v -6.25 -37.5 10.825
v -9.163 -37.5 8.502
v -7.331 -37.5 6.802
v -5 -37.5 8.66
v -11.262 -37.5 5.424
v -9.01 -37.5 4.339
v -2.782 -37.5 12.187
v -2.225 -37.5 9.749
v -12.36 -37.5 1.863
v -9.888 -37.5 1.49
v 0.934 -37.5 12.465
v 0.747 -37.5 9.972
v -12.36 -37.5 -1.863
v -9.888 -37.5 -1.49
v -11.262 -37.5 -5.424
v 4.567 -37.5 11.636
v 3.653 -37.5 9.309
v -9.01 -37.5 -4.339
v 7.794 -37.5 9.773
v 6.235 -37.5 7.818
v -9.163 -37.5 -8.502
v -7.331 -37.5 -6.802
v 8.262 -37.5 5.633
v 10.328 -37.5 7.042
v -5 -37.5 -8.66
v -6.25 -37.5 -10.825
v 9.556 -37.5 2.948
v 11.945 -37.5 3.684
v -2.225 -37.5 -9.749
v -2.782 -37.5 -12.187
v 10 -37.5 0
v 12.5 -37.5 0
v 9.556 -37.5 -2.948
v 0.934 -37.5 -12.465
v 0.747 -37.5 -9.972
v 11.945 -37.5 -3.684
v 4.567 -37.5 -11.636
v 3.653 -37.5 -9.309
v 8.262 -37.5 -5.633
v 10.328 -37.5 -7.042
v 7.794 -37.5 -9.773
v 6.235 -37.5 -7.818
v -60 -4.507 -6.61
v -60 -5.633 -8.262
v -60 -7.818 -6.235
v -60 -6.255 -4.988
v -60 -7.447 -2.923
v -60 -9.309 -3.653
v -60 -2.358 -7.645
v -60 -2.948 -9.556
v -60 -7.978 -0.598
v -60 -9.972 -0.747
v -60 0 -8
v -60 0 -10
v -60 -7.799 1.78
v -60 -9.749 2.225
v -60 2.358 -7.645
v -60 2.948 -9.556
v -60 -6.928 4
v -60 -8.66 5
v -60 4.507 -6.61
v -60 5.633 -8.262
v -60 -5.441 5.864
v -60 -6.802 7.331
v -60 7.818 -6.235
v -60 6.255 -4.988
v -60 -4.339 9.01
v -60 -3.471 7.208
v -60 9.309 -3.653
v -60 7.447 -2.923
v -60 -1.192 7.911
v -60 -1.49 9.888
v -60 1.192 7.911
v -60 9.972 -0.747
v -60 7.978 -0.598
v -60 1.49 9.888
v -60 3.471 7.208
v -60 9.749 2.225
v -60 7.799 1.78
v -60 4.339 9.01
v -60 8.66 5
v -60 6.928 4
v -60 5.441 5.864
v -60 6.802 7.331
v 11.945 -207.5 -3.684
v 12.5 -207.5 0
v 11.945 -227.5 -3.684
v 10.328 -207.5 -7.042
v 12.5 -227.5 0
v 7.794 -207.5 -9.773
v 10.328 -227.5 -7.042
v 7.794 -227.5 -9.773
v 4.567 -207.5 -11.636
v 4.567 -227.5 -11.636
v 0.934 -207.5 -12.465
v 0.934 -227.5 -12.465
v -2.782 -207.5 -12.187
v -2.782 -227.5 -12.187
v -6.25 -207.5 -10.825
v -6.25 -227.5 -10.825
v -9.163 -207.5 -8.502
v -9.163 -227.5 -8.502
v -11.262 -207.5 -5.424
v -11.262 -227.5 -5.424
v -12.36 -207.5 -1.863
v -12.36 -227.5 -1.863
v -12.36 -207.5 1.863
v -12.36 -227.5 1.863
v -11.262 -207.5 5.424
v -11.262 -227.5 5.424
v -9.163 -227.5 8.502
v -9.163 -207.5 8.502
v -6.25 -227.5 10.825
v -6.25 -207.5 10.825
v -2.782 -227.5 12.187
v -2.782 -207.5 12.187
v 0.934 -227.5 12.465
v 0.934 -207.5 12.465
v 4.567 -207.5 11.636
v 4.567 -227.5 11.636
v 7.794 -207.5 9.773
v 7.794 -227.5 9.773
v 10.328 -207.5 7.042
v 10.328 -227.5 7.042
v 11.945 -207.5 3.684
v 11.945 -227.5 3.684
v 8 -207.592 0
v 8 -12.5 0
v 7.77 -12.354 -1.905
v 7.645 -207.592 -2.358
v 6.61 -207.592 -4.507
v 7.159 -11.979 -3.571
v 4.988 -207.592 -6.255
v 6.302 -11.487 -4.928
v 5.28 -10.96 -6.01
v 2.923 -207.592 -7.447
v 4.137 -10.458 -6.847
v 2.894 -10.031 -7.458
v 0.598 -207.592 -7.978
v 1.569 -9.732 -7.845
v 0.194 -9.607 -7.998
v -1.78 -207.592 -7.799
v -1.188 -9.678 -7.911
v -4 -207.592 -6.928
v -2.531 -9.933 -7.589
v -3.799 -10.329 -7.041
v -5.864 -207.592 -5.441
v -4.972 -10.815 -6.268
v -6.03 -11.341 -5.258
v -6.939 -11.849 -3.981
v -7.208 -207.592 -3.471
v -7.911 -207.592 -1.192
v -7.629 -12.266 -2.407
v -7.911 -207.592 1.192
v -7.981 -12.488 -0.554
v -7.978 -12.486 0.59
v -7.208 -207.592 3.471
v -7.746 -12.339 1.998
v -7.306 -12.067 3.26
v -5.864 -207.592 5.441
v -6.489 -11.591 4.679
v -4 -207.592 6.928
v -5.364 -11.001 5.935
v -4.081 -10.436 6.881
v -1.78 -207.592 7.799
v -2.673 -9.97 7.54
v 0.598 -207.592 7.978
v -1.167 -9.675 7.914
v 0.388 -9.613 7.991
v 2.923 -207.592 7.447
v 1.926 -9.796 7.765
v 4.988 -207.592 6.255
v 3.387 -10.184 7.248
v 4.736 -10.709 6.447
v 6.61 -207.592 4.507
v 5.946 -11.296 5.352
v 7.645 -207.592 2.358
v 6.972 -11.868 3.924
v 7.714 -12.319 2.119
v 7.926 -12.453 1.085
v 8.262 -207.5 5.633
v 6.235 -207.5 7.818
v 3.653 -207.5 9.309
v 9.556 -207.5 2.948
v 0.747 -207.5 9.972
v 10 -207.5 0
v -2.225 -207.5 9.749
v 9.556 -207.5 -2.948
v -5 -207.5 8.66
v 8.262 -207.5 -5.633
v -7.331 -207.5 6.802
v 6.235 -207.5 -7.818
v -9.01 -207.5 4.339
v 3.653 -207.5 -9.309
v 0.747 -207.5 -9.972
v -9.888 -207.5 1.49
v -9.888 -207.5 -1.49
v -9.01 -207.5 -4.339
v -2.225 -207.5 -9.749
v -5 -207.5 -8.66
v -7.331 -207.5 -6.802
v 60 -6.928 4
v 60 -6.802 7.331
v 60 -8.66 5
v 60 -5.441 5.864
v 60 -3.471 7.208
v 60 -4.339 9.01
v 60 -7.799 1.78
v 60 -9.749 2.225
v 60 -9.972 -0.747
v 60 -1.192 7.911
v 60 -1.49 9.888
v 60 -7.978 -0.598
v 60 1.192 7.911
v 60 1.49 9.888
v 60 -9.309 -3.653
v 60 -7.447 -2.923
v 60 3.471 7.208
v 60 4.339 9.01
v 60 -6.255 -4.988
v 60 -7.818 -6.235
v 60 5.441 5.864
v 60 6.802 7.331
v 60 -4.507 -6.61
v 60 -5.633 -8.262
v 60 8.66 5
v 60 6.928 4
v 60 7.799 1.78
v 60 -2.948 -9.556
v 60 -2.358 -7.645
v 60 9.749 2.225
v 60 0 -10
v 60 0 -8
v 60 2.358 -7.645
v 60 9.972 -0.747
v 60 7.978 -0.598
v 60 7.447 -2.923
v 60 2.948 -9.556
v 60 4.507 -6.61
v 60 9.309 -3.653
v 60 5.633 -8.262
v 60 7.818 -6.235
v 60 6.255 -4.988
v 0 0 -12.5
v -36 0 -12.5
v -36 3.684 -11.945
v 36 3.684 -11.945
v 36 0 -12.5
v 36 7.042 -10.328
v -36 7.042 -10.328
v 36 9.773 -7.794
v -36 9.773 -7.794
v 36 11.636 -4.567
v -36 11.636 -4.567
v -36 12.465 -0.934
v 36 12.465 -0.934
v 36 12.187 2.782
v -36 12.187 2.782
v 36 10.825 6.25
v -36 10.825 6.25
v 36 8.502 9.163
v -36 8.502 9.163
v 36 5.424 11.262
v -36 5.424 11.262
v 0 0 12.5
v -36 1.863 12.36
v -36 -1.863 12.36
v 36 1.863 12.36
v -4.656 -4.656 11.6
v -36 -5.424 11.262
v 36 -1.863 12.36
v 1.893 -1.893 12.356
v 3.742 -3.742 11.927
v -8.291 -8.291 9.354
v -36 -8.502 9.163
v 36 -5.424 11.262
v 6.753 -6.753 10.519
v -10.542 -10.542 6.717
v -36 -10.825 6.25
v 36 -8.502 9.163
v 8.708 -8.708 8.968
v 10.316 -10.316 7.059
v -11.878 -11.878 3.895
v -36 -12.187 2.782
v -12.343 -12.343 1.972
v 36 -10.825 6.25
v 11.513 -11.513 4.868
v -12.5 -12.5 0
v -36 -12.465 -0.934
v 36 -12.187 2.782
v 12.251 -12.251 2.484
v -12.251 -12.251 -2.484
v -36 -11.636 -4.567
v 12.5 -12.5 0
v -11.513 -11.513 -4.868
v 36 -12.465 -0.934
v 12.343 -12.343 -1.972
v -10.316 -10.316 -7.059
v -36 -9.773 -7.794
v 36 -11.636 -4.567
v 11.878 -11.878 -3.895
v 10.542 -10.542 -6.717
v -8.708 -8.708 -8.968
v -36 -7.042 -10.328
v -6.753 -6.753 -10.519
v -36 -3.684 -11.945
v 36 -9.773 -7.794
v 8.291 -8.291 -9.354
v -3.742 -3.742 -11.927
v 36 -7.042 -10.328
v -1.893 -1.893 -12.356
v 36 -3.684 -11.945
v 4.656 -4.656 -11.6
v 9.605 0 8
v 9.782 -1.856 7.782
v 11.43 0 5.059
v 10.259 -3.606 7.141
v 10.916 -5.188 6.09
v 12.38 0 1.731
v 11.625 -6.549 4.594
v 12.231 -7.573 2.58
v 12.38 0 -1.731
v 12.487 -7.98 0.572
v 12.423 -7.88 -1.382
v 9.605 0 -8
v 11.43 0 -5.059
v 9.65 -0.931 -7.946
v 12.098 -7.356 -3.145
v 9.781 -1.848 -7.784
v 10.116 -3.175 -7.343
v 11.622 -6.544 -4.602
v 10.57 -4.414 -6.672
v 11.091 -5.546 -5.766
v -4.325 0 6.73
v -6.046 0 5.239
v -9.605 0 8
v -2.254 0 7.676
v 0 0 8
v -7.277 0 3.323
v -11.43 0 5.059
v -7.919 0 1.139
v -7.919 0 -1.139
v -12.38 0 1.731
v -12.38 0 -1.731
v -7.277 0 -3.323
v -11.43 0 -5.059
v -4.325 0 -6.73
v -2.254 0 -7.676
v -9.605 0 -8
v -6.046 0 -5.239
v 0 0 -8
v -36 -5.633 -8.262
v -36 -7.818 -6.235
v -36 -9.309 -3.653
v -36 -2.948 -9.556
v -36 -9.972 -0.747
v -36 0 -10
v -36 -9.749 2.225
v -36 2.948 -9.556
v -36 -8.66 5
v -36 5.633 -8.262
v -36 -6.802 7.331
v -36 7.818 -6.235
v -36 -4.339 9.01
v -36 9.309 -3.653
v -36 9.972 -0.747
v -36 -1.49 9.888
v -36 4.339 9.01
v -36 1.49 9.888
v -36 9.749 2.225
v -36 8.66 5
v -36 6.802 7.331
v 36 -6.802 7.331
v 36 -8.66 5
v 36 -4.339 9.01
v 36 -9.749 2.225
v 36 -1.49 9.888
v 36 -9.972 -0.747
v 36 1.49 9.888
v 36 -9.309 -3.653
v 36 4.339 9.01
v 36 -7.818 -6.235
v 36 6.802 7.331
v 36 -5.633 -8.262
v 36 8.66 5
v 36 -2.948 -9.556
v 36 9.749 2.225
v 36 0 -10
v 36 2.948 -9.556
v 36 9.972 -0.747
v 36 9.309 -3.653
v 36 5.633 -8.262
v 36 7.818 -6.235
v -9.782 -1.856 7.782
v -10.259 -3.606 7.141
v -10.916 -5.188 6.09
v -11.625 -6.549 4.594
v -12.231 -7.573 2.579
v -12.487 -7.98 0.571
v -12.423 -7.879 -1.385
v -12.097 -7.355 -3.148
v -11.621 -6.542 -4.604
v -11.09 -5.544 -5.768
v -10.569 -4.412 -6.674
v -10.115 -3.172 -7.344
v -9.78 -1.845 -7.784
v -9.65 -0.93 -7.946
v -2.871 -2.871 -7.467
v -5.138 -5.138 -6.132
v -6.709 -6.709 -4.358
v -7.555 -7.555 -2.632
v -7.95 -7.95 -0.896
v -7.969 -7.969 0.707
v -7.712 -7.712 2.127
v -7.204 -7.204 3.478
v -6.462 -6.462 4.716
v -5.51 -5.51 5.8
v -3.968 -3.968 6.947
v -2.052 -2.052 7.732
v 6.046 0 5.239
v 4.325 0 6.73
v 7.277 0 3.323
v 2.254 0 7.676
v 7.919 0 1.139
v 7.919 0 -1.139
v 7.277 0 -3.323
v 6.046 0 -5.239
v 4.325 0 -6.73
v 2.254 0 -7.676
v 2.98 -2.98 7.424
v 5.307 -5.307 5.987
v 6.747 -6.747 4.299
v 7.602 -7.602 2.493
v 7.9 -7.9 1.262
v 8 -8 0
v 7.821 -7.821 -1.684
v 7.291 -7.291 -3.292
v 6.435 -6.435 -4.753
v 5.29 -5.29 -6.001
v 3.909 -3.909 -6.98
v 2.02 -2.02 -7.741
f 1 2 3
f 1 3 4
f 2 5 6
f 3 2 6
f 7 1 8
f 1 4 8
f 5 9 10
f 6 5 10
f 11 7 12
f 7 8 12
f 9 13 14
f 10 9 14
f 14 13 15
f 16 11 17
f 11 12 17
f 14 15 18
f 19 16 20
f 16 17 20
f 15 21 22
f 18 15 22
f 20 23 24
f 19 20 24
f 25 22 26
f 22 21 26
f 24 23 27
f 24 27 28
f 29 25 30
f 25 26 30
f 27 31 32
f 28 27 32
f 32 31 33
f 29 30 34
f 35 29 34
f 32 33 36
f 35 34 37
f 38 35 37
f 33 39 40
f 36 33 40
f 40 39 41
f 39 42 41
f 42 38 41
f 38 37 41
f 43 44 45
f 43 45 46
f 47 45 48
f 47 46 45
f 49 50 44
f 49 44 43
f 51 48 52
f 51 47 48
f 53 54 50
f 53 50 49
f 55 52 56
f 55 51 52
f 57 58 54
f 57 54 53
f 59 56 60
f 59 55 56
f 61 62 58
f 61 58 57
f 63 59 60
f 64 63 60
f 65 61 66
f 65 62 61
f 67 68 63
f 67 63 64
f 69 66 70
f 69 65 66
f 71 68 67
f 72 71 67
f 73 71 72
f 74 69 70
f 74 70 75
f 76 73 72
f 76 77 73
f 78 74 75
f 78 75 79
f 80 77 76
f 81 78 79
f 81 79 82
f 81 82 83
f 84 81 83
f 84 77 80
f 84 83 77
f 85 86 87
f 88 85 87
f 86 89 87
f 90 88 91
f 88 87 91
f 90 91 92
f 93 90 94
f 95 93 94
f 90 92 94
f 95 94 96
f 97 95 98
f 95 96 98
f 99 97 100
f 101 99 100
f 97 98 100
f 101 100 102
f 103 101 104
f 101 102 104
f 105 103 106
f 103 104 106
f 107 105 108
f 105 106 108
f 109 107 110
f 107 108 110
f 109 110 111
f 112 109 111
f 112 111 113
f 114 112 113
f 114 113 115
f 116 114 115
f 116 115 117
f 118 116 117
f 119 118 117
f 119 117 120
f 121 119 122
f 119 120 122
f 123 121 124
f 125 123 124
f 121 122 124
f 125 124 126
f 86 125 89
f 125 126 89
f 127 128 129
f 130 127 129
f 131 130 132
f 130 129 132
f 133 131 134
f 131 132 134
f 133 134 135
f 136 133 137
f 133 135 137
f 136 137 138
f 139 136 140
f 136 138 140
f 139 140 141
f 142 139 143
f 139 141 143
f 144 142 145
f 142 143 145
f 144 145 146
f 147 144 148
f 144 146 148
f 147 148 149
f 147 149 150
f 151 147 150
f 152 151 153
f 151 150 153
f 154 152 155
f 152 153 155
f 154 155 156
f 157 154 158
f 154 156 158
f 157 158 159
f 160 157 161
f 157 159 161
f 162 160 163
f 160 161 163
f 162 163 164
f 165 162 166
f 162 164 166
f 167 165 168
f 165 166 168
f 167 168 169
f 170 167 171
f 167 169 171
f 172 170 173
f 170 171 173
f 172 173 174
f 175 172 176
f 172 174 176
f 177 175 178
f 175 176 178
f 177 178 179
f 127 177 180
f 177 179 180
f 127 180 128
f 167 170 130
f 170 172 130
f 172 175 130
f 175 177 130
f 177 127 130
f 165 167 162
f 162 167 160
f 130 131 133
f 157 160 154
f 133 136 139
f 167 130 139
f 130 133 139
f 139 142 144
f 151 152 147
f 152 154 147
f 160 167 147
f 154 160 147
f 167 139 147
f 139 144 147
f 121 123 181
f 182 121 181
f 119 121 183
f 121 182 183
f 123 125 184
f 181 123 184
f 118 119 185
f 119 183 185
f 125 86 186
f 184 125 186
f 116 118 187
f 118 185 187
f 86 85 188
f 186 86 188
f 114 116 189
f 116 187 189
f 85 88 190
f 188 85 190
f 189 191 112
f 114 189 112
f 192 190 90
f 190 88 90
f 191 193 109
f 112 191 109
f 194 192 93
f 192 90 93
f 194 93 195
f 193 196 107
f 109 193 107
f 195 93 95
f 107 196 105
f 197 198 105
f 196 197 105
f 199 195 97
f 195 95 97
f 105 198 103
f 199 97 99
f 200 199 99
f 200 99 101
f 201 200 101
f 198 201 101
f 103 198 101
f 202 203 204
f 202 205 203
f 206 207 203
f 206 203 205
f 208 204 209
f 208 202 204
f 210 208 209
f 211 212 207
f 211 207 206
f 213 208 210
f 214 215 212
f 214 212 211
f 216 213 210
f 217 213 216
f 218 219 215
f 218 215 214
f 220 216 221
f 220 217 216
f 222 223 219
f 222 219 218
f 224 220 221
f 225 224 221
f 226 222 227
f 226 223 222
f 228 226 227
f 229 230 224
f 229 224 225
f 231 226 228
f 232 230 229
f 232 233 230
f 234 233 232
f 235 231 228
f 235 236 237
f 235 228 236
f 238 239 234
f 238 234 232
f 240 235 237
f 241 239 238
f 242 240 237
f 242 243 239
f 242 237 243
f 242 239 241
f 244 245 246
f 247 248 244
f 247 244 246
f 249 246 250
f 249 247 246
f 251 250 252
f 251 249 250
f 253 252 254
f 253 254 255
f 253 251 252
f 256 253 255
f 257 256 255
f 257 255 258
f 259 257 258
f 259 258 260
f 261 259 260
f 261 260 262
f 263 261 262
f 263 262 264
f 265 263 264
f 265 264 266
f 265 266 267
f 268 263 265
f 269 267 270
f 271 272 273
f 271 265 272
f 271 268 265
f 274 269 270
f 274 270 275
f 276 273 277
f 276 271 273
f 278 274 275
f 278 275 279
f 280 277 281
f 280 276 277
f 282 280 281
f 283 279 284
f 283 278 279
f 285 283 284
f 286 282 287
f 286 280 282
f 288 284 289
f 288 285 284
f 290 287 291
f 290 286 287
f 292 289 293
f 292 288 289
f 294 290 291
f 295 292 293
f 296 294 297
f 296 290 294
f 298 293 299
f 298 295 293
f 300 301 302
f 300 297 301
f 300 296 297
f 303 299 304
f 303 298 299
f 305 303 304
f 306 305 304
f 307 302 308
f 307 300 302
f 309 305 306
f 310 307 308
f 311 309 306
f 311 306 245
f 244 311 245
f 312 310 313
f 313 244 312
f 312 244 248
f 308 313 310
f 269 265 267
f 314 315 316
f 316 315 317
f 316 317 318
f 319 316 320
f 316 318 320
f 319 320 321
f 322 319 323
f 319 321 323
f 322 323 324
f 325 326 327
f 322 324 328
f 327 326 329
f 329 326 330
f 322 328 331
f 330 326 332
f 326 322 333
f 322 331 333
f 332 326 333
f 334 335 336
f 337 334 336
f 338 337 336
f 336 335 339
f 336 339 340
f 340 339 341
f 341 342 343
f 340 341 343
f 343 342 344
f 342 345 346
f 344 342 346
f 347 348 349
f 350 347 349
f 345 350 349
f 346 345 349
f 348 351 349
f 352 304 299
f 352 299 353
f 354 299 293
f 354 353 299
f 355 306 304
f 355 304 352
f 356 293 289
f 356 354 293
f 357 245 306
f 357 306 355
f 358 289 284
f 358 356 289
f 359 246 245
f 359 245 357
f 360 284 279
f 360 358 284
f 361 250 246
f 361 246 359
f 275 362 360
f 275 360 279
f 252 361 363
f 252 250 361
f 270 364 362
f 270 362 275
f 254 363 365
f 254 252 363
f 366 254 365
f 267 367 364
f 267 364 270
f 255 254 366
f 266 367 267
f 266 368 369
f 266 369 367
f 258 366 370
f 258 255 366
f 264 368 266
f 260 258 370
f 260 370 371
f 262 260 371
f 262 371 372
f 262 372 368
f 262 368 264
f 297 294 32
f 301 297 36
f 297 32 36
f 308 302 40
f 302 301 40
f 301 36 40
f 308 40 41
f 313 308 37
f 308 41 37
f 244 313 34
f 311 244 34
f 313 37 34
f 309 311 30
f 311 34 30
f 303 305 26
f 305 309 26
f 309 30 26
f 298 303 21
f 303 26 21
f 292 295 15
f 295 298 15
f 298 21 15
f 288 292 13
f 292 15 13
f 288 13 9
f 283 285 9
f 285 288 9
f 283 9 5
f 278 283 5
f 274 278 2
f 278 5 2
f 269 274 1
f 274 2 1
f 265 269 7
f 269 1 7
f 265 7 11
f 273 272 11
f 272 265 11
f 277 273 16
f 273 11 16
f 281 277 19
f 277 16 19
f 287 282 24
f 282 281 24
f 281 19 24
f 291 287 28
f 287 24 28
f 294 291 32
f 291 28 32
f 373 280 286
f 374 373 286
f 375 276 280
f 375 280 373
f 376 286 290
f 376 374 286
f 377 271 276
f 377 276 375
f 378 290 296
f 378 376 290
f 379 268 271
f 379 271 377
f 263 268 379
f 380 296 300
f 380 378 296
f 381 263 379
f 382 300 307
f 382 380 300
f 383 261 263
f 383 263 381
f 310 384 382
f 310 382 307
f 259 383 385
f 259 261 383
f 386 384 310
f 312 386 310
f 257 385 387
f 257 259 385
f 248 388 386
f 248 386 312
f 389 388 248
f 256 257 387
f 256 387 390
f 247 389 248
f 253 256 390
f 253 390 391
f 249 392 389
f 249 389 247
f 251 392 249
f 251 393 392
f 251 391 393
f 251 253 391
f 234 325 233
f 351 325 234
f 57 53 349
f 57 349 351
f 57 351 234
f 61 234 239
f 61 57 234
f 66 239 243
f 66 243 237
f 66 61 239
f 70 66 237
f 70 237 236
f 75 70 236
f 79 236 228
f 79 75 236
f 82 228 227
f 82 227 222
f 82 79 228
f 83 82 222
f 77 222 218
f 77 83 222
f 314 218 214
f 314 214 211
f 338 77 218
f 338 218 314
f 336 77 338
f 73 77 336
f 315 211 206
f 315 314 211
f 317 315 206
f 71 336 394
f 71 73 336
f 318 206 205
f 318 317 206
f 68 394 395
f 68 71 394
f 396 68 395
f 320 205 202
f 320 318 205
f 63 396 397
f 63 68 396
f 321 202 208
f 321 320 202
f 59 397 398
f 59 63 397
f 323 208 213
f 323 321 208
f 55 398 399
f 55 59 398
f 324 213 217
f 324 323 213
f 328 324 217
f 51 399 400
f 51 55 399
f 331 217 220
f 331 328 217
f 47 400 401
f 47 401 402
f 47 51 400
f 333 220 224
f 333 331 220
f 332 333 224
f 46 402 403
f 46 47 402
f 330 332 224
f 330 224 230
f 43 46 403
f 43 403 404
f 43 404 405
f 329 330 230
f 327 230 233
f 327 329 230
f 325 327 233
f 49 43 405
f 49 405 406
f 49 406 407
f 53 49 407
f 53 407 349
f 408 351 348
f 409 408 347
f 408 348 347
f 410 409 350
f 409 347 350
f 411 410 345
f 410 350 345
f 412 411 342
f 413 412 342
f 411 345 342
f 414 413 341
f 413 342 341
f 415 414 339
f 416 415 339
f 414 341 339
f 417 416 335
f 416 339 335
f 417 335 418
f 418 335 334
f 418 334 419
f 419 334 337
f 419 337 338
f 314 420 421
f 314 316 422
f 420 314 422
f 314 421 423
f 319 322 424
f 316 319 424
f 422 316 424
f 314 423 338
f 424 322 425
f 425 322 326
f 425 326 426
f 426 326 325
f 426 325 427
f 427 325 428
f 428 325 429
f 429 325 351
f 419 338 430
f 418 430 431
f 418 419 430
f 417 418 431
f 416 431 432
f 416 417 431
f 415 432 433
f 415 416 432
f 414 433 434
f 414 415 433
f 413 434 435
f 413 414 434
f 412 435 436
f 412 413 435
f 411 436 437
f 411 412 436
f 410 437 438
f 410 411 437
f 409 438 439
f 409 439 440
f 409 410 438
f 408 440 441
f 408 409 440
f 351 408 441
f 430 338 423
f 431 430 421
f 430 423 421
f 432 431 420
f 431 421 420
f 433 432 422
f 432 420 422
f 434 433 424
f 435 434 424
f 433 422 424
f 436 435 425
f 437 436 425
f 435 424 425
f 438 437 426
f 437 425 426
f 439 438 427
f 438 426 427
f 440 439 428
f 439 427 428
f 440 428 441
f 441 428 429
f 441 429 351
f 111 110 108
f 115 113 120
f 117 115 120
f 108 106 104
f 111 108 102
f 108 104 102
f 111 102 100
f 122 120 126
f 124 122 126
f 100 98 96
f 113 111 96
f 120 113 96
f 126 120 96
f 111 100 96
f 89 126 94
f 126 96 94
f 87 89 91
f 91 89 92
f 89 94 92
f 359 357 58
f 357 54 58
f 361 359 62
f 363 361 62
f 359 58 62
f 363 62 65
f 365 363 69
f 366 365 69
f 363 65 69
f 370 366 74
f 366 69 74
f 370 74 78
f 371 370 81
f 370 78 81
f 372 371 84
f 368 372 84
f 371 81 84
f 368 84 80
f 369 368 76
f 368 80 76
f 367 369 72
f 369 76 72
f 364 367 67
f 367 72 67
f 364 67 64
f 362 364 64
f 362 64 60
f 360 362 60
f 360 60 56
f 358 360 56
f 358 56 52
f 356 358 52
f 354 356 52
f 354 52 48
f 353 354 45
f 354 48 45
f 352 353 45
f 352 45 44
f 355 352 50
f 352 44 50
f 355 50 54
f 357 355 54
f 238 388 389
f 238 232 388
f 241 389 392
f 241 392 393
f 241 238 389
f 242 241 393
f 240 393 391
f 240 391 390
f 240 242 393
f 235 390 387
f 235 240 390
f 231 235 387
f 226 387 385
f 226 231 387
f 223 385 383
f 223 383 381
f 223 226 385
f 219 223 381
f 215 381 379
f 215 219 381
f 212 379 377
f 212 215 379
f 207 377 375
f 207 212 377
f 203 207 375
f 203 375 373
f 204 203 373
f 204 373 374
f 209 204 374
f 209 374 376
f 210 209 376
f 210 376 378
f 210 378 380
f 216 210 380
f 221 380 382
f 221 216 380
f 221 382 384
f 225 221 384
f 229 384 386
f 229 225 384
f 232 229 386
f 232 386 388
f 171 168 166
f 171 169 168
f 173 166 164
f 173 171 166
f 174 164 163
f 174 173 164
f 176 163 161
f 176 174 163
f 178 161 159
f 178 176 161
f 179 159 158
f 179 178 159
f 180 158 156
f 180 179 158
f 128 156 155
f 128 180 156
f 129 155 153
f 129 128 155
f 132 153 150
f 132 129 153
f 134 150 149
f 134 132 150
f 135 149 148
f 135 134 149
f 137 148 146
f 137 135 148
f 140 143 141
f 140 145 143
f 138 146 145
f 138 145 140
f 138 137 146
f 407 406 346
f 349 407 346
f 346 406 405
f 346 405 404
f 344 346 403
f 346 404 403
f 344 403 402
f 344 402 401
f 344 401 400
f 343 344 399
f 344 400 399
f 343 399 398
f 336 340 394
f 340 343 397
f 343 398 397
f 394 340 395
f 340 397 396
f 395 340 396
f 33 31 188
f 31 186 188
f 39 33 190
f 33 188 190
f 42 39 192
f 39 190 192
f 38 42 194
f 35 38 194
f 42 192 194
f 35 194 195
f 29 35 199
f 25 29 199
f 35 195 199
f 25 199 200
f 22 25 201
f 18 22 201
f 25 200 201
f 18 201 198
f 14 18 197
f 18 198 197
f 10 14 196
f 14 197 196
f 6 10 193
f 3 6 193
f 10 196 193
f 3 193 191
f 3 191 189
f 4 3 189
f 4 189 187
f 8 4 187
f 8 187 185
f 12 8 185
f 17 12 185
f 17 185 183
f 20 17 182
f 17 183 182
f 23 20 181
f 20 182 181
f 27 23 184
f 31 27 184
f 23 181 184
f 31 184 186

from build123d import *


with BuildPart() as part:
    # 草图1 → Revolve 394 (revolve)
    with BuildSketch(Plane.XY):
        Polygon((-12.5, 0), (-12.5, -37.5), (-10, -37.5), (-10, -207.5), (-12.5, -207.5), (-12.5, -227.5), (0, -227.5), (0, -207.591623727), (-8, -207.591623727), (-8, 0), align=None)
    revolve(axis=Axis((0, -1459.557248463, 0), (0, 1, 0)))


with BuildPart() as revolve_813_tool:
    # 草图3 → Revolve 813 (revolve)
    with BuildSketch(Plane(origin=(0, 0, 0), x_dir=(1, 0, 0), z_dir=(0, 1, 0))):
        Polygon((-60, 10), (-40, 10), (-36, 10), (-36, 12.5), (36, 12.5), (36, 10), (60, 10), (60, 8), (-60, 8), align=None)
    revolve(axis=Axis((60, 0, 0), (1, 0, 0)))


with BuildPart() as part_1:
    add(part.part)


with BuildPart() as part_2:
    # Revolve 813: joined with revolve_813_tool
    add(part_1.part.fuse(revolve_813_tool.part, tol=0.00001))


solid = part_2.part
